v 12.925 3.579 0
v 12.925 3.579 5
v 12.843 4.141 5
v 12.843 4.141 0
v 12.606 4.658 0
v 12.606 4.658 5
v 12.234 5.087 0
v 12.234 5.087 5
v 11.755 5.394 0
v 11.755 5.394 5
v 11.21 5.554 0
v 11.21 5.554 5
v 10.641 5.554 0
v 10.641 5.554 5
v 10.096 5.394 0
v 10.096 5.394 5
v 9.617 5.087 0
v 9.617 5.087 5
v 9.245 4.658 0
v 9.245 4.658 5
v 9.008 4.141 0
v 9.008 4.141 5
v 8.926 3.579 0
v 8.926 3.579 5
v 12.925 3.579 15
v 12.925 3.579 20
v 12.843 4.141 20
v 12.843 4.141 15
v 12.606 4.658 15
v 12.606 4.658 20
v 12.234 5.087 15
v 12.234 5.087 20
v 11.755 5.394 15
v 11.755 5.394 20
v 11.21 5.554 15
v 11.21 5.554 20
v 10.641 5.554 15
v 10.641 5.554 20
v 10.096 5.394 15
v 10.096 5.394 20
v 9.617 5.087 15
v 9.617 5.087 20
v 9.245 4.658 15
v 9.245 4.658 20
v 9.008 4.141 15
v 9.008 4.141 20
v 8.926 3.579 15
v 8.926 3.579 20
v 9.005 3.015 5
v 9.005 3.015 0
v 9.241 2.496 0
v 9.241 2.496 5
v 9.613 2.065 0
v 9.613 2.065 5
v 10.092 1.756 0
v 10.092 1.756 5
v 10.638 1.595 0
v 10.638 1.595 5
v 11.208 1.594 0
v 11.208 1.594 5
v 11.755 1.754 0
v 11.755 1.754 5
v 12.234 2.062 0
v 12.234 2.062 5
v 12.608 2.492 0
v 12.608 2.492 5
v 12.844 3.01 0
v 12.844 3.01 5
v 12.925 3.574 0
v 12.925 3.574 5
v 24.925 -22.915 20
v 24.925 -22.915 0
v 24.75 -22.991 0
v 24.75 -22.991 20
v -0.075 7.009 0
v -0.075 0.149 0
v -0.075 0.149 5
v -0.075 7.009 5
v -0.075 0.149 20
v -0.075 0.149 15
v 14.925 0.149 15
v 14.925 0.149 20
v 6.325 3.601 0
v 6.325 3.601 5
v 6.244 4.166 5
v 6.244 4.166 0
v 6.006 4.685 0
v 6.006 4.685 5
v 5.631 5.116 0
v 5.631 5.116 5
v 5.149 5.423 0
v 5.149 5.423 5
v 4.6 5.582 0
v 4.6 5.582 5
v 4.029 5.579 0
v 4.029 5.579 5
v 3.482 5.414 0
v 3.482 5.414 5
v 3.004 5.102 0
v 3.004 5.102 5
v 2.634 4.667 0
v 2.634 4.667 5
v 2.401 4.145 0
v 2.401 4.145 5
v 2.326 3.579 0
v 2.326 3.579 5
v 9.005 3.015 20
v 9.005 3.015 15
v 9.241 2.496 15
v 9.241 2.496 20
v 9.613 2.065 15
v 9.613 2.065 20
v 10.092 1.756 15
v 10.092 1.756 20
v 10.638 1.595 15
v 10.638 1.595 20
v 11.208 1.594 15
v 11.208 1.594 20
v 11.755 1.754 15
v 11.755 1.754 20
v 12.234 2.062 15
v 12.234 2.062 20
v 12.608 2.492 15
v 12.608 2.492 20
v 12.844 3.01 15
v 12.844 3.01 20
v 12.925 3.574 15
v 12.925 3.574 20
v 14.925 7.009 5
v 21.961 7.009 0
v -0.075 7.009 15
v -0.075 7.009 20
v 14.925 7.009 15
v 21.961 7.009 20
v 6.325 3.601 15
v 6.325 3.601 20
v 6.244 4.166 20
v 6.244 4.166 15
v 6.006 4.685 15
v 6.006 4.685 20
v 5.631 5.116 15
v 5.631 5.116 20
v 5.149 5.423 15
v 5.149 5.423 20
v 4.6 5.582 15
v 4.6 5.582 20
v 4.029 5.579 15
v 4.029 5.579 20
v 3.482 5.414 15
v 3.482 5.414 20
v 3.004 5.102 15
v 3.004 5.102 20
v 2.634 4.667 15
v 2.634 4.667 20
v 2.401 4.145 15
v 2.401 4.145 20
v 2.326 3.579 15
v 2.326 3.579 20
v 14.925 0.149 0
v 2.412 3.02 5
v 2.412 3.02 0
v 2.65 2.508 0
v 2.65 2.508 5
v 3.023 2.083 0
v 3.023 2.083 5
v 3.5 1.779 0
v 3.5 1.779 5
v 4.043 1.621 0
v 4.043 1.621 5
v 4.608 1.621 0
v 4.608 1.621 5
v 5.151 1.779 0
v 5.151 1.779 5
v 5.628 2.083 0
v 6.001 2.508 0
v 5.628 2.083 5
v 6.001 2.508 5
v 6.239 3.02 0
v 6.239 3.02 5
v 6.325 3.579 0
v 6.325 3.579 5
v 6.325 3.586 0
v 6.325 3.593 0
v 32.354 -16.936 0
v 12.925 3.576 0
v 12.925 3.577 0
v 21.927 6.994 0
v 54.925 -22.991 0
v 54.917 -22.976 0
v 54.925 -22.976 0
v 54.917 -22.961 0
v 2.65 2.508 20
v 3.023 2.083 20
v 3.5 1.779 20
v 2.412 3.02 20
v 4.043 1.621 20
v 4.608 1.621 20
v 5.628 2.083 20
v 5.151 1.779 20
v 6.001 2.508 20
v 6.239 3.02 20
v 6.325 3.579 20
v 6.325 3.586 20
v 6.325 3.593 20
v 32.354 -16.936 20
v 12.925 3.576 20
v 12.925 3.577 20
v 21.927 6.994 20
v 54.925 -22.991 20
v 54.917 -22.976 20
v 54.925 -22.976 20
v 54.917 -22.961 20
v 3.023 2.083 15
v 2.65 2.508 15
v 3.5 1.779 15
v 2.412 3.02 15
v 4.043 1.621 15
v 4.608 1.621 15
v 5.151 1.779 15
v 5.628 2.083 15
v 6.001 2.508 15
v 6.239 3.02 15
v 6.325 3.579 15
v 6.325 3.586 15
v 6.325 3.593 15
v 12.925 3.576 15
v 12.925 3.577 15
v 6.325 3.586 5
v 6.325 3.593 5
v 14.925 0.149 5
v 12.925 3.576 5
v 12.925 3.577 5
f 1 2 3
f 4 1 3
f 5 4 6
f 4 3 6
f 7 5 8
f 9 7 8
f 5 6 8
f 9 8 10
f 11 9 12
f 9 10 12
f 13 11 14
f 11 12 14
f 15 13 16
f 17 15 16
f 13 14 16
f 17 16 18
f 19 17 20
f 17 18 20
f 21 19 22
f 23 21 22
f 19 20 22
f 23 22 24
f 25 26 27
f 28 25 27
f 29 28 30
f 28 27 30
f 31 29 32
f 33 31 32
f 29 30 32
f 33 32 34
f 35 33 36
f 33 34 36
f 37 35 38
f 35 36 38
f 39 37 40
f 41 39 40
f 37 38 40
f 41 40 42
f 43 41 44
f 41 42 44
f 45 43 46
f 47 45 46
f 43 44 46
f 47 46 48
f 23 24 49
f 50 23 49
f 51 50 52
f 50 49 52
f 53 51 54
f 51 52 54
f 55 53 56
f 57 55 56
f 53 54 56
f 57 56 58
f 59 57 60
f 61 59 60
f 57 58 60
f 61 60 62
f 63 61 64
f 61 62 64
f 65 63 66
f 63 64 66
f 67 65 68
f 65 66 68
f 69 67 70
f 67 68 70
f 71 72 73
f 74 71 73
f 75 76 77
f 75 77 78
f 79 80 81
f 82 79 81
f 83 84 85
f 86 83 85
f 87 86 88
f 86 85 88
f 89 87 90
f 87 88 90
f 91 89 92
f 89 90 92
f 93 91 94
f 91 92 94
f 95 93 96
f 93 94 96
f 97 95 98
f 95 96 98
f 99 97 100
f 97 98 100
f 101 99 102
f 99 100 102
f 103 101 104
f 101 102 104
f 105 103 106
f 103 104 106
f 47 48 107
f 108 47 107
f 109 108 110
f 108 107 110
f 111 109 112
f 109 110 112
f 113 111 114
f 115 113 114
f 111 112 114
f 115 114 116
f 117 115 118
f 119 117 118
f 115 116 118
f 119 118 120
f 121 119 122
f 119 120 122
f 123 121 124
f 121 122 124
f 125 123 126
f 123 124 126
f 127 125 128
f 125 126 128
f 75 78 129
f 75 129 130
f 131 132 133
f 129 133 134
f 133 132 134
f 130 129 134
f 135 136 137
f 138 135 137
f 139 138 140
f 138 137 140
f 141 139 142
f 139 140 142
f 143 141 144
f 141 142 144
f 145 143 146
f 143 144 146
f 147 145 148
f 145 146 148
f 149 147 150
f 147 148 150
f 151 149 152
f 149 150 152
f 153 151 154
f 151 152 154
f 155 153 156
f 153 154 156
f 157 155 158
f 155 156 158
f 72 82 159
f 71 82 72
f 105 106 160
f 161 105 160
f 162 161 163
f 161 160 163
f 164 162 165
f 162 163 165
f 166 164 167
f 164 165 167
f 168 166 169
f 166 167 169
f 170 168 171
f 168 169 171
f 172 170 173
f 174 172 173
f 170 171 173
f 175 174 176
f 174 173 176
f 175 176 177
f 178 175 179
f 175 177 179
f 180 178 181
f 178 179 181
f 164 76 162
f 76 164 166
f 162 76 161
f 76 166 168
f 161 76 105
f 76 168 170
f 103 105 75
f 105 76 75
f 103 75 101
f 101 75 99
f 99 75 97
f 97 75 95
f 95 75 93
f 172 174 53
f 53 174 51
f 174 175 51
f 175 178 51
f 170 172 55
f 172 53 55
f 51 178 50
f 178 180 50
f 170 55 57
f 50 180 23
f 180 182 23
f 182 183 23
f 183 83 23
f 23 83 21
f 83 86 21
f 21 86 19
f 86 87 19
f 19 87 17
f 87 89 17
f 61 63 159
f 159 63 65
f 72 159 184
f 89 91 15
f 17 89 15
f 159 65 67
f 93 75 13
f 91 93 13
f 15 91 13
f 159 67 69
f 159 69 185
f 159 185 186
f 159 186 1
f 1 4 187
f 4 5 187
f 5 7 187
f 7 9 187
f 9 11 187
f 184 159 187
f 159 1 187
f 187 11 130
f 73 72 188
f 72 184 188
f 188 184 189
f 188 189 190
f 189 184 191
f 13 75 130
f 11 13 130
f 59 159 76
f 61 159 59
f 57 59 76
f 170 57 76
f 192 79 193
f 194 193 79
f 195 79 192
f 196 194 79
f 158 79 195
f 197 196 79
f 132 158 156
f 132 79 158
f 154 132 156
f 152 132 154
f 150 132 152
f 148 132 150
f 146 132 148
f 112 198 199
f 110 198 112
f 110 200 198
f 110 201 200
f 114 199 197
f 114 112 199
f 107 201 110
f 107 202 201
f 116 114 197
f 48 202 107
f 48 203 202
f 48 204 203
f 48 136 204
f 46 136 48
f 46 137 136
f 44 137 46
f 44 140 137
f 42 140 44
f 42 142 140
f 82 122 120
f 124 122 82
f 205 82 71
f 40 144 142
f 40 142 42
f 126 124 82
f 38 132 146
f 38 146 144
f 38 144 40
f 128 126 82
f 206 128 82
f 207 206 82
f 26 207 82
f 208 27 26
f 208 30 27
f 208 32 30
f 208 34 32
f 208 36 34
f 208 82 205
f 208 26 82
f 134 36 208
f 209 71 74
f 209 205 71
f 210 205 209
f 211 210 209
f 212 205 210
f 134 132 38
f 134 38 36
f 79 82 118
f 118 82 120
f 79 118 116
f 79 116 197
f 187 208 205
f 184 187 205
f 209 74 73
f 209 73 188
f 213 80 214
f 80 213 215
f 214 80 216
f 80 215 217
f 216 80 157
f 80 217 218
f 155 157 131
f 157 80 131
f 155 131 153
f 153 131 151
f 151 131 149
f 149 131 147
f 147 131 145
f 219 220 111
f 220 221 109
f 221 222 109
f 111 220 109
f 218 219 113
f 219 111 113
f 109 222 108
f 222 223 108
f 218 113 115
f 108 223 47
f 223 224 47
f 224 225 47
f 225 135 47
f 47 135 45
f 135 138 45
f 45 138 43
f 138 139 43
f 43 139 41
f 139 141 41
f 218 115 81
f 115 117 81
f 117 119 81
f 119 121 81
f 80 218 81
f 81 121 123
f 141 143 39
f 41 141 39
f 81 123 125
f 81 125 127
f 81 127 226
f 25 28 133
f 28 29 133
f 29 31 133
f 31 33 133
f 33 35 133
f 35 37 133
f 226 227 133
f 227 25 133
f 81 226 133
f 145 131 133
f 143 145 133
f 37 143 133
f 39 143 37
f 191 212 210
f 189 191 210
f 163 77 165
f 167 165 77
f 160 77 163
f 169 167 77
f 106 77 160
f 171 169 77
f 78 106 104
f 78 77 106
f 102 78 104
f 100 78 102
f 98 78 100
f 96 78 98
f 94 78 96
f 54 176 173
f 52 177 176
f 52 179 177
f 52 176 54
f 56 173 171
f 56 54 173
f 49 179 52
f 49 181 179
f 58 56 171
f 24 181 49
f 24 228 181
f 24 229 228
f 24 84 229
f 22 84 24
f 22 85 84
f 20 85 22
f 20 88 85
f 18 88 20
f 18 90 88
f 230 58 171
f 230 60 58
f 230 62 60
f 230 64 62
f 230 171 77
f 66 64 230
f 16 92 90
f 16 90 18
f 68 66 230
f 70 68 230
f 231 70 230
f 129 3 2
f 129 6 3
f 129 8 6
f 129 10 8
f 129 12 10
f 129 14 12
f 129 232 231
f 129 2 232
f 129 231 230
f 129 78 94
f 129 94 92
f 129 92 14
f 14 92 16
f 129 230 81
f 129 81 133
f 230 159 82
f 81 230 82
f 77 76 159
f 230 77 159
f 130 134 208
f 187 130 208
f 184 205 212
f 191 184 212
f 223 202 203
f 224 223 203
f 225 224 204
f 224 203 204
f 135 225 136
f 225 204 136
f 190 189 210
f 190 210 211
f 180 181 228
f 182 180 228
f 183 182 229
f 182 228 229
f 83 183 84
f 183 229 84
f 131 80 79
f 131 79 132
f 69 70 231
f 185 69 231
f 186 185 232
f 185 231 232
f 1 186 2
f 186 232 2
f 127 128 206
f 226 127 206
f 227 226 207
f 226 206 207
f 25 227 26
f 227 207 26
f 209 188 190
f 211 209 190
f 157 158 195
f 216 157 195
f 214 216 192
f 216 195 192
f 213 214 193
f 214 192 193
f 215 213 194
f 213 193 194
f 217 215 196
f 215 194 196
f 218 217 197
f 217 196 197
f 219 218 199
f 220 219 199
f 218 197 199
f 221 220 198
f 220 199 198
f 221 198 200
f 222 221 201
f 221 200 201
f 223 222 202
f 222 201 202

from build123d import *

# Parameters (mm, degrees)
SKETCH2_W               = 15
SKETCH2_H               = 6.86
BOSS_EXTRUDE1_DEPTH     = 20
SKETCH4_W               = 40
SKETCH4_H               = 30
BOSS_EXTRUDE2_DEPTH     = 20
CUT_EXTRUDE_THIN1_DEPTH = 20
CUT_EXTRUDE_THIN2_DEPTH = 20
SKETCH10_W              = 15
SKETCH10_H              = 10
CUT_EXTRUDE4_DEPTH      = 20
CUT_EXTRUDE5_DEPTH      = 20


with BuildPart() as part:
    # Sketch2 → Boss-Extrude1 (new body)
    with BuildSketch(Plane.XY):
        with Locations((7.425496689, 3.579006623)):
            Rectangle(SKETCH2_W, SKETCH2_H)
    extrude(amount=BOSS_EXTRUDE1_DEPTH)

    # Sketch4 → Boss-Extrude2 (add)
    with BuildSketch(Plane.XY.offset(20)):
        with Locations((34.925496689, -7.990993377)):
            Rectangle(SKETCH4_W, SKETCH4_H)
    extrude(amount=-BOSS_EXTRUDE2_DEPTH)

    # Sketch6 → Cut-Extrude-Thin1 (cut)
    with BuildSketch(Plane.XY.offset(20)):
        Polygon((14.925491376, 0.149003146), (24.925496689, -22.915069368), (15.750749541, -26.893010391), (5.750744229, -3.828937877), align=None)
    extrude(amount=-CUT_EXTRUDE_THIN1_DEPTH, mode=Mode.SUBTRACT)

    # Sketch7 → Cut-Extrude-Thin2 (cut)
    with BuildSketch(Plane.XY.offset(20)):
        Polygon((21.92715857, 6.994080588), (32.354035132, -16.936455783), (54.974089749, -22.976067343), (57.553745552, -13.314526268), (39.594610752, -8.51939204), (31.094733139, 10.988523793), align=None)
        Polygon((22.041113505, 7.165012991), (54.974089749, 6.994080588), (54.917112281, -22.976067343), (64.917094209, -22.995078715), (64.993020621, 16.942213912), (22.09301592, 17.164878297), align=None)
    extrude(amount=-CUT_EXTRUDE_THIN2_DEPTH, mode=Mode.SUBTRACT)


with BuildPart() as body_2:
    # of the pieces the cut leaves, the one that is kept (cut_extrude_thin2_keep)
    add(part.part.solids().sort_by_distance((-0.074503311, 0.149006623, 0))[0])

    # Sketch10 → Cut-Extrude4 (cut)
    with BuildSketch(Plane(origin=(0, 7.009006623, 0), x_dir=(1, 0, 0), z_dir=(0, 1, 0))):
        with Locations((7.425496689, -10)):
            Rectangle(SKETCH10_W, SKETCH10_H)
    extrude(amount=-CUT_EXTRUDE4_DEPTH, mode=Mode.SUBTRACT)

    # Sketch11 → Cut-Extrude5 (cut)
    with BuildSketch(Plane.XY.offset(20)):
        with BuildLine():
            ThreePointArc((6.325496689, 3.60059408), (4.314702178, 5.60056495), (2.32561321, 3.579005373))
            Line((2.32561321, 3.579005373), (6.325380145, 3.579003291))
            ThreePointArc((6.325380145, 3.579003291), (6.325467553, 3.589798528), (6.325496689, 3.60059408))
        make_face()
        with BuildLine():
            Line((6.325380145, 3.579003291), (2.32561321, 3.579005373))
            ThreePointArc((2.32561321, 3.579005373), (4.325495648, 1.60059408), (6.325380145, 3.579003291))
        make_face()
        with BuildLine():
            ThreePointArc((12.92549092, 3.578999855), (10.92549773, 5.574196049), (8.925502463, 3.579001937))
            Line((8.925502463, 3.579001937), (12.92549092, 3.578999855))
        make_face()
        with BuildLine():
            Line((12.92549092, 3.578999855), (8.925502463, 3.579001937))
            ThreePointArc((8.925502463, 3.579001937), (10.923093743, 1.574197492), (12.925496689, 3.574196049))
            ThreePointArc((12.925496689, 3.574196049), (12.925495246, 3.576597954), (12.92549092, 3.578999855))
        make_face()
    extrude(amount=-CUT_EXTRUDE5_DEPTH, mode=Mode.SUBTRACT)


solid = body_2.part
